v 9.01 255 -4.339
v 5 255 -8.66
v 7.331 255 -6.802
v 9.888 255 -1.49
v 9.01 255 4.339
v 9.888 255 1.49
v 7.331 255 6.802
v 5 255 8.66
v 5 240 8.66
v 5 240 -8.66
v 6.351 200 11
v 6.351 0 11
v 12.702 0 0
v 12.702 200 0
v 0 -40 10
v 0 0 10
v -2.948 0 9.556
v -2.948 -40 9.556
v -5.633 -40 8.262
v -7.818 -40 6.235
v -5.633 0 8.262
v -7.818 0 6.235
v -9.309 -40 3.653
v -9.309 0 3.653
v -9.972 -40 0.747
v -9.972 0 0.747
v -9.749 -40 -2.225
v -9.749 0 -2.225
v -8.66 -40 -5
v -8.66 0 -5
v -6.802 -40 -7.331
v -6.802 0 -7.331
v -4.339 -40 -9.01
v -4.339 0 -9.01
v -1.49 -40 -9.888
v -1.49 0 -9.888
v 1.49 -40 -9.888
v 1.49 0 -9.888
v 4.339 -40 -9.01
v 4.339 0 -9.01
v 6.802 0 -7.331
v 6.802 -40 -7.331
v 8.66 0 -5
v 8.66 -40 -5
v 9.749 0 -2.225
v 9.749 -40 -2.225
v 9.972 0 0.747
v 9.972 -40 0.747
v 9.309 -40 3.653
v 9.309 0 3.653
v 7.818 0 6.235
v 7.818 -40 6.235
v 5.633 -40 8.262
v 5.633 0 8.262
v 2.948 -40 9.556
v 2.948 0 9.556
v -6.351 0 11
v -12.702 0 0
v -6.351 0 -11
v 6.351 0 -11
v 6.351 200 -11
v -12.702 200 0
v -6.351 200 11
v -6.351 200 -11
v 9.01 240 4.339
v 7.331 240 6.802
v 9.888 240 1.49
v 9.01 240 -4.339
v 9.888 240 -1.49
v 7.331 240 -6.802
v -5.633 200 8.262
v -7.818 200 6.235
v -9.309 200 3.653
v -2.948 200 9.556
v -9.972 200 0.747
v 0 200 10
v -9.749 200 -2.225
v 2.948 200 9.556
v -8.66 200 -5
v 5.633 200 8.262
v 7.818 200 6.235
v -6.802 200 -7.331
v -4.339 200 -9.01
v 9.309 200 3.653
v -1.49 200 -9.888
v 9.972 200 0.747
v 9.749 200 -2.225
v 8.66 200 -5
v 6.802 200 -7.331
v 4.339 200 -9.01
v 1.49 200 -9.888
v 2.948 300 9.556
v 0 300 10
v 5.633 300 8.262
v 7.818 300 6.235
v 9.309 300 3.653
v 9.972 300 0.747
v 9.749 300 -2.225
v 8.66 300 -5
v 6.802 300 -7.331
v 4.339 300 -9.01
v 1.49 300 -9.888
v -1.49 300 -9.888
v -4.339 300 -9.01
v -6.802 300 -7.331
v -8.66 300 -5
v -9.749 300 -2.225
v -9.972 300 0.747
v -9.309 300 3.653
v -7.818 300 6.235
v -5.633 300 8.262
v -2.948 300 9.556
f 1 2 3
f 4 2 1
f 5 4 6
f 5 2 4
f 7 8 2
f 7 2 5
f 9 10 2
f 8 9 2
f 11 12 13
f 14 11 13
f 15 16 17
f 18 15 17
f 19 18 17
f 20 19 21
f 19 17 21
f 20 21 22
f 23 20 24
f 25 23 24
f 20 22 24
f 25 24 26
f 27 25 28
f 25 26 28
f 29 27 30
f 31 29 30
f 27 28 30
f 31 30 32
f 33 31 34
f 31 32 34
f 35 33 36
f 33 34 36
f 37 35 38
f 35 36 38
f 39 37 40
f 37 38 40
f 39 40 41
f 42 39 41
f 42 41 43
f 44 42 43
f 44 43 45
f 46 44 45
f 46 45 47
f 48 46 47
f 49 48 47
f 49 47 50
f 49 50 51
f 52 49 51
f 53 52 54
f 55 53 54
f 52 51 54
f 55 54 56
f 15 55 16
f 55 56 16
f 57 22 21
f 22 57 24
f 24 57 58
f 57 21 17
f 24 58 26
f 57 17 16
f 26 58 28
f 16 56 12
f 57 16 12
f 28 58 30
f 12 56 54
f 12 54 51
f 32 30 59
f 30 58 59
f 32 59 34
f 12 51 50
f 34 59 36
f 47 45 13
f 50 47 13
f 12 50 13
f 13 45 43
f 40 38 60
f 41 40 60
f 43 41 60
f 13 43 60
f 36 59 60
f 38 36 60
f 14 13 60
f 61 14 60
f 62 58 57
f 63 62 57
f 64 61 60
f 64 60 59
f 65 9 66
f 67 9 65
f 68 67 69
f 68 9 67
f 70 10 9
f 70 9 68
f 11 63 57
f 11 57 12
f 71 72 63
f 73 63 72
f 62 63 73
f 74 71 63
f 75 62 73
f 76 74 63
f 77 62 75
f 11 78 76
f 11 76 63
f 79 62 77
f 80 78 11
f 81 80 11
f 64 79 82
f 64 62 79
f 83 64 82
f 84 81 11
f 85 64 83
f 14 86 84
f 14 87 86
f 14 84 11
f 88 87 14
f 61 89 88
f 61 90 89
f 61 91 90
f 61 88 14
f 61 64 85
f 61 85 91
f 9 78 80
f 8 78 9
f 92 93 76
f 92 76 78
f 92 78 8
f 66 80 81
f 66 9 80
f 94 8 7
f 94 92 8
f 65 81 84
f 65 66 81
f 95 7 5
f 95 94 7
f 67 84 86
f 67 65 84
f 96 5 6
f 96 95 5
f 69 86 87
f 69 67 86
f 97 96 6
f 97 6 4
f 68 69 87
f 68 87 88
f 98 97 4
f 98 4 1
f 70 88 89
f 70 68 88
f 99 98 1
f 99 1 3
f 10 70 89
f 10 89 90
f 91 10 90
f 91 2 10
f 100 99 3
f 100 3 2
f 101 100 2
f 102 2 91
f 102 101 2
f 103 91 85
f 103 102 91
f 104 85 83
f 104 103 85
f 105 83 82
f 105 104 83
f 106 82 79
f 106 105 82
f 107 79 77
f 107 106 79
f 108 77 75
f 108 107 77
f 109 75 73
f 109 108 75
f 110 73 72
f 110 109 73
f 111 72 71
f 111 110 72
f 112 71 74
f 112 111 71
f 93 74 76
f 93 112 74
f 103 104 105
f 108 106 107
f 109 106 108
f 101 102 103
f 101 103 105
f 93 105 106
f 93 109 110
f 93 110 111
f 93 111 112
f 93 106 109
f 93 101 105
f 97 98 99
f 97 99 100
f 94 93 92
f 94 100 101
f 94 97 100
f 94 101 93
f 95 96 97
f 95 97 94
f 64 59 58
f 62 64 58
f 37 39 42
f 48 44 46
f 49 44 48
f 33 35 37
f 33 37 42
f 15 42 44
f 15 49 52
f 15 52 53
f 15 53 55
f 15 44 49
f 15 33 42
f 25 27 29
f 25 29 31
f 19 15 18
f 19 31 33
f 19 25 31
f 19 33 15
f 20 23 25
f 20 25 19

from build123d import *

# Parameters (mm, degrees)
BOSS_EXTRUDE1_DEPTH                 = 200
SKETCH4_R                           = 10
BOSS_EXTRUDE4_DEPTH                 = 40
BOSS_EXTRUDE5_START                 = 100
SKETCH5_R                           = 10
BOSS_EXTRUDE5_DEPTH                 = 100
CUT_EXTRUDE1_REACH                  = 302.47
CUT_EXTRUDE1_END_RADIUS             = 10
SKETCH6_W                           = 5
SKETCH6_H                           = 15
CUT_EXTRUDE1_DIRECTION_2_REACH      = 302.47
CUT_EXTRUDE1_DIRECTION_2_END_RADIUS = 10


with BuildPart() as part:
    # Sketch1 → Boss-Extrude1 (new body)
    with BuildSketch(Plane(origin=(0, 0, 0), x_dir=(1, 0, 0), z_dir=(0, 1, 0))):
        Polygon((12.701705922, 0), (6.350852961, 11), (-6.350852961, 11), (-12.701705922, 0), (-6.350852961, -11), (6.350852961, -11), align=None)
    extrude(amount=BOSS_EXTRUDE1_DEPTH)

    # Sketch4 → Boss-Extrude4 (add)
    with BuildSketch(Plane.XZ):
        with Locations(Location((0, 0, 0), (0, 0, 90))):
            Circle(SKETCH4_R)
    extrude(amount=BOSS_EXTRUDE4_DEPTH)

    # Sketch5 → Boss-Extrude5 (add)
    with BuildSketch(Plane(origin=(0, 200, 0), x_dir=(1, 0, 0), z_dir=(0, 1, 0)).offset(BOSS_EXTRUDE5_START)):
        with Locations(Location((0, 0, 0), (0, 0, 270))):
            Circle(SKETCH5_R)
    extrude(amount=-BOSS_EXTRUDE5_DEPTH)

    # Cut-Extrude1: up to this cylinder (the profile starts inside it)
    cut_extrude1_end = Plane(origin=(0, 247.5, 0), z_dir=(0, -1, 0)) * Cylinder(CUT_EXTRUDE1_END_RADIUS, 625.94, mode=Mode.PRIVATE)
    # Sketch6 → Cut-Extrude1 (cut, up to the surface)
    with BuildSketch(Plane.XY, mode=Mode.PRIVATE) as cut_extrude1_sk1:
        with Locations((7.5, 247.5)):
            Rectangle(SKETCH6_W, SKETCH6_H)
    cut_extrude1_tool1 = extrude(cut_extrude1_sk1.sketch, amount=-CUT_EXTRUDE1_REACH, mode=Mode.PRIVATE) & cut_extrude1_end
    add(cut_extrude1_tool1.solids().sort_by_distance((7.5, 247.5, 0))[0], mode=Mode.SUBTRACT)

    # Cut-Extrude1 direction 2: up to this cylinder (the profile starts inside it)
    cut_extrude1_direction_2_end = Plane(origin=(0, 247.5, 0), z_dir=(0, -1, 0)) * Cylinder(CUT_EXTRUDE1_DIRECTION_2_END_RADIUS, 625.94, mode=Mode.PRIVATE)
    # Sketch6 → Cut-Extrude1 direction 2 (cut, up to the surface)
    with BuildSketch(Plane.XY, mode=Mode.PRIVATE) as cut_extrude1_direction_2_sk1:
        with Locations((7.5, 247.5)):
            Rectangle(SKETCH6_W, SKETCH6_H)
    cut_extrude1_direction_2_tool1 = extrude(cut_extrude1_direction_2_sk1.sketch, amount=CUT_EXTRUDE1_DIRECTION_2_REACH, mode=Mode.PRIVATE) & cut_extrude1_direction_2_end
    add(cut_extrude1_direction_2_tool1.solids().sort_by_distance((7.5, 247.5, 0))[0], mode=Mode.SUBTRACT)


solid = part.part
